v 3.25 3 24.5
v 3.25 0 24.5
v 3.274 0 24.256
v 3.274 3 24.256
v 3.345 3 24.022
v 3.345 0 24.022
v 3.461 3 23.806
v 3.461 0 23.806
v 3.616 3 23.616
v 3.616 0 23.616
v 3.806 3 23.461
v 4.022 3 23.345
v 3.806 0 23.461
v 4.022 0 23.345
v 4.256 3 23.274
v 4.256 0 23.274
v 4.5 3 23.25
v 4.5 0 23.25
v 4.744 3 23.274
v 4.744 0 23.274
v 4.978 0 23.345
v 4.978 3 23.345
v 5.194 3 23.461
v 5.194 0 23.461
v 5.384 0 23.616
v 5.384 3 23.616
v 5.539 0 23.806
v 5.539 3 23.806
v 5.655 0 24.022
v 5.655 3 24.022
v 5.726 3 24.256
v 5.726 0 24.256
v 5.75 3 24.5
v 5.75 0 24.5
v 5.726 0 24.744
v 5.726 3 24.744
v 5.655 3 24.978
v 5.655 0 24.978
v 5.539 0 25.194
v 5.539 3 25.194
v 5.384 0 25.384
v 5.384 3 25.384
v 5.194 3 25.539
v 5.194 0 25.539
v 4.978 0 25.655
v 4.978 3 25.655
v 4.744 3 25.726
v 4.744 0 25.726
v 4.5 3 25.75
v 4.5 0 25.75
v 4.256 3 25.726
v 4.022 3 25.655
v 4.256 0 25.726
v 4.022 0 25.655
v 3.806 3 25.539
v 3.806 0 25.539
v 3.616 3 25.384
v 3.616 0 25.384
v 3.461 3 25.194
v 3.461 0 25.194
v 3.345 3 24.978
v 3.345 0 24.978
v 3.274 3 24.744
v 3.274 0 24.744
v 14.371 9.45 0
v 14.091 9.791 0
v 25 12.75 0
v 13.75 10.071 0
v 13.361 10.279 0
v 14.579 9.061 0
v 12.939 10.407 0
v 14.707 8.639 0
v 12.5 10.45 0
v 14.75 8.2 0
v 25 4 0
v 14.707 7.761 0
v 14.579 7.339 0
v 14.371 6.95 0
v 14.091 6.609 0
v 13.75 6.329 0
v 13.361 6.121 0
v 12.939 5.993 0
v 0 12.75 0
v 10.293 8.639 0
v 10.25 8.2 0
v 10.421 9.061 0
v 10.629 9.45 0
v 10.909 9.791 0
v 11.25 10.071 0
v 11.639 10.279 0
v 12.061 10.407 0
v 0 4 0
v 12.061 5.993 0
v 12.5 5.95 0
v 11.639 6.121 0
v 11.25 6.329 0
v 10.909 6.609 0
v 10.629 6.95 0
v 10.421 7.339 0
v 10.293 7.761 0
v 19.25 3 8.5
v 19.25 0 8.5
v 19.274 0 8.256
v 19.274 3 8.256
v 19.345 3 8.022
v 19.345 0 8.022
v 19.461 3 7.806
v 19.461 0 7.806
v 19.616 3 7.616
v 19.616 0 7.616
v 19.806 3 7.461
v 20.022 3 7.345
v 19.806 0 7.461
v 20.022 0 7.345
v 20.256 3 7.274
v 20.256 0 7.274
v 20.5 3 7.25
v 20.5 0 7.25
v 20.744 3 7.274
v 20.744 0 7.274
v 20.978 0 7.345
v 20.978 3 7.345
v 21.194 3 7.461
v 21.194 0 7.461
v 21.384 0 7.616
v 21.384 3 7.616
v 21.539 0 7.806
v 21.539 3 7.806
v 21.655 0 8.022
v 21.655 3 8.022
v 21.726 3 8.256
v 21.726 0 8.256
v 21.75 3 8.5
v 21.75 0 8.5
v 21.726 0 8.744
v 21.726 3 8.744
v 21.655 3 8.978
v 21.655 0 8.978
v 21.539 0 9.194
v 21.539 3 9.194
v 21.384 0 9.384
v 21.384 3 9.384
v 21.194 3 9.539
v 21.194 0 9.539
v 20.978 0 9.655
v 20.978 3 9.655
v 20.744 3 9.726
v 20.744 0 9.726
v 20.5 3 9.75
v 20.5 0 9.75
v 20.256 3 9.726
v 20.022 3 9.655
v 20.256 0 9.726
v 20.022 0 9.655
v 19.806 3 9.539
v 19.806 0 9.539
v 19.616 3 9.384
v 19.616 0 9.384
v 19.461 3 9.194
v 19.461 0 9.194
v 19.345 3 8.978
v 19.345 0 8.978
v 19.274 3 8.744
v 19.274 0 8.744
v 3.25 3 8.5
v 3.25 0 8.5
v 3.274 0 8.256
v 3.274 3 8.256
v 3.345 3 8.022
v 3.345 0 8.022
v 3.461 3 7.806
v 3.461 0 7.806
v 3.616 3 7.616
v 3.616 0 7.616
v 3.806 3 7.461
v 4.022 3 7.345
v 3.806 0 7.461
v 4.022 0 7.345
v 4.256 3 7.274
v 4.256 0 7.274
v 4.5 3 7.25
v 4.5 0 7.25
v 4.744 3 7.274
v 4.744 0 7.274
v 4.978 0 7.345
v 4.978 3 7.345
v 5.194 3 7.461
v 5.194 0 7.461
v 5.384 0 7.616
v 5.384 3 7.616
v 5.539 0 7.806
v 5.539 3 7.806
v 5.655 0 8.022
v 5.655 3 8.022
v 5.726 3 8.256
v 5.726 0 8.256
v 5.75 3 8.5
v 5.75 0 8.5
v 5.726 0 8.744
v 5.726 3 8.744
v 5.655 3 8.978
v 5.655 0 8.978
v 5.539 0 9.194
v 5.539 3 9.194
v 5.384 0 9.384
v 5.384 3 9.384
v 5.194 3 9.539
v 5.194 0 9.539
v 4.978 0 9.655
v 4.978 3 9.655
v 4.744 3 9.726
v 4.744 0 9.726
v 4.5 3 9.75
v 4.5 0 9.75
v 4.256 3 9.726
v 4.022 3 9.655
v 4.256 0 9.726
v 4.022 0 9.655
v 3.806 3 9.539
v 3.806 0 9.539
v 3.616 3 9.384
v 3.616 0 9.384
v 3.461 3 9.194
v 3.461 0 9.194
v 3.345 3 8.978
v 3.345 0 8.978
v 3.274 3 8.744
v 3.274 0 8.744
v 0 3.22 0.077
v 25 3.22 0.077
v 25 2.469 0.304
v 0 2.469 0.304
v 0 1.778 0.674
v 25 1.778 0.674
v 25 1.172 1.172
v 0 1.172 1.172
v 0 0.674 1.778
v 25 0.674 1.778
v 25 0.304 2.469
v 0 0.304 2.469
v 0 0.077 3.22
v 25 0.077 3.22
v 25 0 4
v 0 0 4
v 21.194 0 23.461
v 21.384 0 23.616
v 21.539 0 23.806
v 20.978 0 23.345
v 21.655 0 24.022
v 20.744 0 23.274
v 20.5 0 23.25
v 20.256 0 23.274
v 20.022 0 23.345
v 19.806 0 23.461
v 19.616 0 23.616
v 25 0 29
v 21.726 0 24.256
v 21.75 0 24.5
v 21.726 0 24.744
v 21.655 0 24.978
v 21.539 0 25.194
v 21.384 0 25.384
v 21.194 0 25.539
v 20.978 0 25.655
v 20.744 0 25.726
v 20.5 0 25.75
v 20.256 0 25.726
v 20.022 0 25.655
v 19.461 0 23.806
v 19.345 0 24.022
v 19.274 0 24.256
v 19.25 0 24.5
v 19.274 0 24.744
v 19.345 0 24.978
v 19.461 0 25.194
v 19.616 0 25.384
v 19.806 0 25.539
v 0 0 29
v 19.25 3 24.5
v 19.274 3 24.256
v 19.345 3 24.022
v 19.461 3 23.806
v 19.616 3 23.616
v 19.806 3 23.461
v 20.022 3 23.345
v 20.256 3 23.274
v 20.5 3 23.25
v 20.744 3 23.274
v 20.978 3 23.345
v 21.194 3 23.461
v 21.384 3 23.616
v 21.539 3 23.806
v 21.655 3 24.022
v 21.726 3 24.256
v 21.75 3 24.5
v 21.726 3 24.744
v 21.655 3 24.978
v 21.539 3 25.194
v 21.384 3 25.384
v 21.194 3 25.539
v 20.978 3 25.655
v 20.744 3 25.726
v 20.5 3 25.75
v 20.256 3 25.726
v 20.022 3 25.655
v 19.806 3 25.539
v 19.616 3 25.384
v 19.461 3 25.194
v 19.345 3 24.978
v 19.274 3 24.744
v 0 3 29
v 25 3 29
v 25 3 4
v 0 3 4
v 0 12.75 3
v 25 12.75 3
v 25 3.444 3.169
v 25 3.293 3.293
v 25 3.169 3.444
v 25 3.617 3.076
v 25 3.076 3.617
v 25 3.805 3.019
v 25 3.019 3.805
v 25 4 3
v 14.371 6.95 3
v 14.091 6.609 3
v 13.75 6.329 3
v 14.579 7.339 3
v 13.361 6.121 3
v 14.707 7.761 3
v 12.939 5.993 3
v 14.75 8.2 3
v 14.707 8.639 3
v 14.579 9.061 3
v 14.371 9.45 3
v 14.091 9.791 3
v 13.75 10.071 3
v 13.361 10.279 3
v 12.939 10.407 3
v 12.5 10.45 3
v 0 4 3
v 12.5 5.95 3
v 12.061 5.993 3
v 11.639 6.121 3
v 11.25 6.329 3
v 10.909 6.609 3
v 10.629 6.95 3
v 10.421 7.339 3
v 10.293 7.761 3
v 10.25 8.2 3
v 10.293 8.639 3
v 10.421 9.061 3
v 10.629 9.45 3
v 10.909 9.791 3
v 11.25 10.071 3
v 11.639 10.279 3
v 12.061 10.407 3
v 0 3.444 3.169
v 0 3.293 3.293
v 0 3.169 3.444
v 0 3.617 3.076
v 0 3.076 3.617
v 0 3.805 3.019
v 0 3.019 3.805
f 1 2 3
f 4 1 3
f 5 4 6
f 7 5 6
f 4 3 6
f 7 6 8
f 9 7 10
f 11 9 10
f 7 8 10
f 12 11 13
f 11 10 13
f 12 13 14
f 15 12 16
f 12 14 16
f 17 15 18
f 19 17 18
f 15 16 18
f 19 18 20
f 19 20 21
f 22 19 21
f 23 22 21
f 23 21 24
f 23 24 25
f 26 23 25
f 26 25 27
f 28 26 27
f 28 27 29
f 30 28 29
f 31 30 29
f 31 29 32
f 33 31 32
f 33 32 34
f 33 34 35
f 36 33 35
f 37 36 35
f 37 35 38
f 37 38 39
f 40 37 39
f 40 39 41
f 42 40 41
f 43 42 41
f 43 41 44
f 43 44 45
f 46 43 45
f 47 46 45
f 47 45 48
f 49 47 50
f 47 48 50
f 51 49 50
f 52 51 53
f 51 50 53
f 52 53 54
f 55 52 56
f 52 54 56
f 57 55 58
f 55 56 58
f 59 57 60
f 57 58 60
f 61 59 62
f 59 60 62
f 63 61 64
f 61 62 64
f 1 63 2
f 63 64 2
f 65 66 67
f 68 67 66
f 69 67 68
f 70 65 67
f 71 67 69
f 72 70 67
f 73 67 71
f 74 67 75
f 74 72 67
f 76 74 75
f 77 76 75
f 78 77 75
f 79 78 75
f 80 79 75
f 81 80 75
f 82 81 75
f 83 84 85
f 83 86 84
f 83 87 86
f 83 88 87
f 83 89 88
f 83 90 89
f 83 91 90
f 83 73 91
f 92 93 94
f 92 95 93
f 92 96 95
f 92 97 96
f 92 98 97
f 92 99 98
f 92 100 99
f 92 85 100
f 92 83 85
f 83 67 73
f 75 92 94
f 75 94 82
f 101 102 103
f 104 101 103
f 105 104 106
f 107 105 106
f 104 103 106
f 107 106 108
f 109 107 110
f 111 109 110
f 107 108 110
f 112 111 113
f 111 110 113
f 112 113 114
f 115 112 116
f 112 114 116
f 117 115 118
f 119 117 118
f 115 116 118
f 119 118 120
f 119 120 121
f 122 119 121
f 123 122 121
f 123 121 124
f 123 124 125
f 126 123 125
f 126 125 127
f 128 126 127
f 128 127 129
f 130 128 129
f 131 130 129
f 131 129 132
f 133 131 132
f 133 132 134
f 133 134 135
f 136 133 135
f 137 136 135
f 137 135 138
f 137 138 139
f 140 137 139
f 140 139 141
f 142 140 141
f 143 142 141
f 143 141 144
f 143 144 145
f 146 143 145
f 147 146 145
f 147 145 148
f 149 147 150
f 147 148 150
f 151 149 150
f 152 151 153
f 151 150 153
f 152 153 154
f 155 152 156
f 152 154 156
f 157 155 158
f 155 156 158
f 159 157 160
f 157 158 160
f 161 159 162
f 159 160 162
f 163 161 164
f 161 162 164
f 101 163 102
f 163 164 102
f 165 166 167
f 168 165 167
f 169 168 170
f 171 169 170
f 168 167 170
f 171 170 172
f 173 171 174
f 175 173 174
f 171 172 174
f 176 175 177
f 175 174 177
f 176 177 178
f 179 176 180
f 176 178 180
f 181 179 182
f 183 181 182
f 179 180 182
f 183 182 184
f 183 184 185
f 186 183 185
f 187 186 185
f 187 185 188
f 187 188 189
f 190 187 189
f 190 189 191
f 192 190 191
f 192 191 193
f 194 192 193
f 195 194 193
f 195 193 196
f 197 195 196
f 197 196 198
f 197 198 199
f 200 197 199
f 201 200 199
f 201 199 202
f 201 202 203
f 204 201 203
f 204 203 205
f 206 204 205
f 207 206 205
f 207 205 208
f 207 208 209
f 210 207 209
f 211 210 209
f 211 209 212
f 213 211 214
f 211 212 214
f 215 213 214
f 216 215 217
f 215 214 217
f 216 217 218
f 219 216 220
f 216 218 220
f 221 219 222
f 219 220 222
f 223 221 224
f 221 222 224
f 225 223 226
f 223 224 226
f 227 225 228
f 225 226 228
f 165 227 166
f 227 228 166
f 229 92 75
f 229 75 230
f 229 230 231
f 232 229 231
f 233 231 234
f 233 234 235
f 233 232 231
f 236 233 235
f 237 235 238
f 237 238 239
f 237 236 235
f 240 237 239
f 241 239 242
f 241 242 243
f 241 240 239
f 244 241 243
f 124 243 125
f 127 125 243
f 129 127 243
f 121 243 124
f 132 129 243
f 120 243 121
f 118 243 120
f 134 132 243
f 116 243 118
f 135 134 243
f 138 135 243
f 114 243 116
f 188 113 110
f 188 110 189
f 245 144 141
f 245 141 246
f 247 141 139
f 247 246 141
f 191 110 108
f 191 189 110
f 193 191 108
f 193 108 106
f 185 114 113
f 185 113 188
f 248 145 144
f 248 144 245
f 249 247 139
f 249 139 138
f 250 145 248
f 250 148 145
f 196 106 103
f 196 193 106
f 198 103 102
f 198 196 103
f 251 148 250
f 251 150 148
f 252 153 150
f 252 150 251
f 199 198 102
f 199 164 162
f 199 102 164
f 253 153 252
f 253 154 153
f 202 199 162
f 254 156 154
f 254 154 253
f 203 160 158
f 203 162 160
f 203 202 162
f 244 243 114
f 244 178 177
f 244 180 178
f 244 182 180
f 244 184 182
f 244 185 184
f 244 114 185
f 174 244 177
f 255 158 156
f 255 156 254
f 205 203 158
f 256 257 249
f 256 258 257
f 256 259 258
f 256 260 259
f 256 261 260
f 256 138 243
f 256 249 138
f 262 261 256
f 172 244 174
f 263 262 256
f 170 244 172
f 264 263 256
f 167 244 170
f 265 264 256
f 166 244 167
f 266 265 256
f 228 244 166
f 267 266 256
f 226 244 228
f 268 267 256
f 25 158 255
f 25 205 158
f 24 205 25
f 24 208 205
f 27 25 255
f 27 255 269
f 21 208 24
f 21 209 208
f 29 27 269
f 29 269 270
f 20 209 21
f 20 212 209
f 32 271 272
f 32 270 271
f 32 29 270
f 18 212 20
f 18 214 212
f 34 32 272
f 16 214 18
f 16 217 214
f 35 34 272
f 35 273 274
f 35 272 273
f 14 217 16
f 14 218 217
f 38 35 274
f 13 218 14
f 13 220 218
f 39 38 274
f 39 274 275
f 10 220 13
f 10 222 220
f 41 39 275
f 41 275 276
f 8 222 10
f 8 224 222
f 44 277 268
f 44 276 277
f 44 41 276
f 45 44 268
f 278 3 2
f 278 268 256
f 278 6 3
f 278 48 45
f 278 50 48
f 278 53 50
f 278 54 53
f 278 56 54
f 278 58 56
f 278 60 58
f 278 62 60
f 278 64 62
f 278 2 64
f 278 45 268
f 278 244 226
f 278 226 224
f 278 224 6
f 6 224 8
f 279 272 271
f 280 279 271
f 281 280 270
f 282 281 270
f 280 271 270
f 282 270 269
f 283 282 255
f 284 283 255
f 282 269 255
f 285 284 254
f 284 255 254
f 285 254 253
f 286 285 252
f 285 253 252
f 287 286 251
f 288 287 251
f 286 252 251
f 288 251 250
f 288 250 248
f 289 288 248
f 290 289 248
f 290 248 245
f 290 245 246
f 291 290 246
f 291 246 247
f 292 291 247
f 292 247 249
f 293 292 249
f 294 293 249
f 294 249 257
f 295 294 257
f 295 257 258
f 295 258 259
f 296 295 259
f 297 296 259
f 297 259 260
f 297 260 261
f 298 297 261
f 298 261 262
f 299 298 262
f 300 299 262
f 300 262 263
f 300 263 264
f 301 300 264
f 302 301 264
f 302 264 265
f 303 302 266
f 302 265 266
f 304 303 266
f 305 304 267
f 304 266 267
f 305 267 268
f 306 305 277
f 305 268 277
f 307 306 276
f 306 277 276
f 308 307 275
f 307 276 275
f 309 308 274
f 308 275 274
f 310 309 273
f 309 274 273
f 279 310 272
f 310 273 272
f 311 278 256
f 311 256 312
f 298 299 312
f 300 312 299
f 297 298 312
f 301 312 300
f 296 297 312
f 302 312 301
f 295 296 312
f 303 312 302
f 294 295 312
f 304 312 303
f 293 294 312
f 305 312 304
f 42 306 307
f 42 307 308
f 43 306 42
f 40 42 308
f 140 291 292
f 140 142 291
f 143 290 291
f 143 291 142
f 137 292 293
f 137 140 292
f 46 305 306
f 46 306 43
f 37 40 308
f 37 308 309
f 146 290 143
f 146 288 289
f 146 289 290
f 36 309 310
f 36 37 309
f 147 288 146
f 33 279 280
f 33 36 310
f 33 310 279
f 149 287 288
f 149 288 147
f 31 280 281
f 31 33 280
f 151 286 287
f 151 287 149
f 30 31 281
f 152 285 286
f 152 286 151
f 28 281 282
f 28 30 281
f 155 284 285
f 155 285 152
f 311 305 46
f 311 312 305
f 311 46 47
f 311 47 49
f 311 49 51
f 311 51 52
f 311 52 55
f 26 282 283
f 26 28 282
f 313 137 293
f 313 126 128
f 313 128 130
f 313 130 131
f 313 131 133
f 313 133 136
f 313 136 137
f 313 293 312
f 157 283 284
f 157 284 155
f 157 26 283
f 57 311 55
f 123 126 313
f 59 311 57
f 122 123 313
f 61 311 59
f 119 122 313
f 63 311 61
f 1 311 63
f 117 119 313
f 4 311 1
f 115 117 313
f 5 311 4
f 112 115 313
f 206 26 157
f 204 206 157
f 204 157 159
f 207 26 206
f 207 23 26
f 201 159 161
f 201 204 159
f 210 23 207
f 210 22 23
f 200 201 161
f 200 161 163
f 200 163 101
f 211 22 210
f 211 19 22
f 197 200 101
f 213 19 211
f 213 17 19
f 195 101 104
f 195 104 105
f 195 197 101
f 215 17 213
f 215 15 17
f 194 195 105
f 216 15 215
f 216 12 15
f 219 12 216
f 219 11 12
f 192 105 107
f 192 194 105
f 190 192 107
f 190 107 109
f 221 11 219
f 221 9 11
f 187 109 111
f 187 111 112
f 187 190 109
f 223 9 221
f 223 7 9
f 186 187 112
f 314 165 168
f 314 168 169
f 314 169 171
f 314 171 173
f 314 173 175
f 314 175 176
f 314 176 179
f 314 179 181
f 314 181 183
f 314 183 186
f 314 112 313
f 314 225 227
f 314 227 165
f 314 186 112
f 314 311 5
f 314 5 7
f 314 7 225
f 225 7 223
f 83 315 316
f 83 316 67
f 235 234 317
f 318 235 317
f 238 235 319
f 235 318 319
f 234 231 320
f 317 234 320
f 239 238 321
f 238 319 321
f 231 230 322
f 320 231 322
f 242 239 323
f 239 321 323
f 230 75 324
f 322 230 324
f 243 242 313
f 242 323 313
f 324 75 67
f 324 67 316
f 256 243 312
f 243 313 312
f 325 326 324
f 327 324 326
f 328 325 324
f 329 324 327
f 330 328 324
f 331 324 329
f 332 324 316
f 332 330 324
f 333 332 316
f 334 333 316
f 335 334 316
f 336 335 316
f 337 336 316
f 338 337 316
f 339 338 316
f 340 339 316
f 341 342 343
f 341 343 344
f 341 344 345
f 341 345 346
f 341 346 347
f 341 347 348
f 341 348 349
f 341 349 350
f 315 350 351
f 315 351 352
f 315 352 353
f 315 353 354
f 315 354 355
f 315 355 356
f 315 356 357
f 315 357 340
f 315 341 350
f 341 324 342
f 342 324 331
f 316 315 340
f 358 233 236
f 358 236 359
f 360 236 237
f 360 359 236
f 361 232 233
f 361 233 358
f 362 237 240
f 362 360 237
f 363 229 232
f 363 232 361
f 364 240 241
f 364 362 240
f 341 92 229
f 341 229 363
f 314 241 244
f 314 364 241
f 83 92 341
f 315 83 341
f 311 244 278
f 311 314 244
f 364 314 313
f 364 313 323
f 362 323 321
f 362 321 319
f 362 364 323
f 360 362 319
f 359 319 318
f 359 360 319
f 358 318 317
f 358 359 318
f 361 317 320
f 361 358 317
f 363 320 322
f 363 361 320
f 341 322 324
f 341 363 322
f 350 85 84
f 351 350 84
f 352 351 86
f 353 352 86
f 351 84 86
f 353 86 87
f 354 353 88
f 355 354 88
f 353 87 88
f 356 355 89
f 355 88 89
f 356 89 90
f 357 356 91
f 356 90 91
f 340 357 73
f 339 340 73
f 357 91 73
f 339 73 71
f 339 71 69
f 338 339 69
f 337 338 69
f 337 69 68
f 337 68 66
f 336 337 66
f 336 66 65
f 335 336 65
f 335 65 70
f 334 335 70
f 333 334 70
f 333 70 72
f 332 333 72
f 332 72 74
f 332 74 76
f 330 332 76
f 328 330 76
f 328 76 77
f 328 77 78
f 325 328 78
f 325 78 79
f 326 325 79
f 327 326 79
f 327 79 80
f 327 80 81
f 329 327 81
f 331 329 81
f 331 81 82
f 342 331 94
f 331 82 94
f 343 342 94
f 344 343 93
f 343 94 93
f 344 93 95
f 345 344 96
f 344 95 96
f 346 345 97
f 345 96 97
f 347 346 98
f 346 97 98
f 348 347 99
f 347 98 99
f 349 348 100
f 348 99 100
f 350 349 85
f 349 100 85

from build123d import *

# Parameters (mm, degrees)
T_LE_DE_BASE_PLI_E1_DEPTH = 25
TROU_TARAUD_M31_D         = 2.5
D_GAGEMENT_M41_D          = 4.5


# Sheet-metal steps are written as plain solids
with BuildPart() as part:
    # Esquisse1 → Tôle de base pliée1 (new body)
    with BuildSketch(Plane(origin=(0, 0, 0), x_dir=(0, 0, -1), z_dir=(1, 0, 0))):
        with BuildLine():
            Line((0, 12.75), (0, 4))
            ThreePointArc((0, 4), (-1.171572875, 1.171572875), (-4, 0))
            Line((-4, 0), (-29, 0))
            Line((-29, 0), (-29, 3))
            Line((-29, 3), (-4, 3))
            ThreePointArc((-4, 3), (-3.292893219, 3.292893219), (-3, 4))
            Line((-3, 4), (-3, 12.75))
            Line((-3, 12.75), (0, 12.75))
        make_face()
    extrude(amount=T_LE_DE_BASE_PLI_E1_DEPTH)

    # Trou taraudé M31 (through all)
    with Locations(Plane(origin=(0, 3, 0), x_dir=(1, 0, 0), z_dir=(0, 1, 0))):
        with Locations((4.5, -24.5), (4.5, -8.5), (20.5, -8.5), (20.5, -24.5)):
            Hole(TROU_TARAUD_M31_D / 2)

    # Dégagement M41 (through all)
    with Locations(Plane.XY.offset(3)):
        with Locations((12.5, 8.2)):
            Hole(D_GAGEMENT_M41_D / 2)


solid = part.part
